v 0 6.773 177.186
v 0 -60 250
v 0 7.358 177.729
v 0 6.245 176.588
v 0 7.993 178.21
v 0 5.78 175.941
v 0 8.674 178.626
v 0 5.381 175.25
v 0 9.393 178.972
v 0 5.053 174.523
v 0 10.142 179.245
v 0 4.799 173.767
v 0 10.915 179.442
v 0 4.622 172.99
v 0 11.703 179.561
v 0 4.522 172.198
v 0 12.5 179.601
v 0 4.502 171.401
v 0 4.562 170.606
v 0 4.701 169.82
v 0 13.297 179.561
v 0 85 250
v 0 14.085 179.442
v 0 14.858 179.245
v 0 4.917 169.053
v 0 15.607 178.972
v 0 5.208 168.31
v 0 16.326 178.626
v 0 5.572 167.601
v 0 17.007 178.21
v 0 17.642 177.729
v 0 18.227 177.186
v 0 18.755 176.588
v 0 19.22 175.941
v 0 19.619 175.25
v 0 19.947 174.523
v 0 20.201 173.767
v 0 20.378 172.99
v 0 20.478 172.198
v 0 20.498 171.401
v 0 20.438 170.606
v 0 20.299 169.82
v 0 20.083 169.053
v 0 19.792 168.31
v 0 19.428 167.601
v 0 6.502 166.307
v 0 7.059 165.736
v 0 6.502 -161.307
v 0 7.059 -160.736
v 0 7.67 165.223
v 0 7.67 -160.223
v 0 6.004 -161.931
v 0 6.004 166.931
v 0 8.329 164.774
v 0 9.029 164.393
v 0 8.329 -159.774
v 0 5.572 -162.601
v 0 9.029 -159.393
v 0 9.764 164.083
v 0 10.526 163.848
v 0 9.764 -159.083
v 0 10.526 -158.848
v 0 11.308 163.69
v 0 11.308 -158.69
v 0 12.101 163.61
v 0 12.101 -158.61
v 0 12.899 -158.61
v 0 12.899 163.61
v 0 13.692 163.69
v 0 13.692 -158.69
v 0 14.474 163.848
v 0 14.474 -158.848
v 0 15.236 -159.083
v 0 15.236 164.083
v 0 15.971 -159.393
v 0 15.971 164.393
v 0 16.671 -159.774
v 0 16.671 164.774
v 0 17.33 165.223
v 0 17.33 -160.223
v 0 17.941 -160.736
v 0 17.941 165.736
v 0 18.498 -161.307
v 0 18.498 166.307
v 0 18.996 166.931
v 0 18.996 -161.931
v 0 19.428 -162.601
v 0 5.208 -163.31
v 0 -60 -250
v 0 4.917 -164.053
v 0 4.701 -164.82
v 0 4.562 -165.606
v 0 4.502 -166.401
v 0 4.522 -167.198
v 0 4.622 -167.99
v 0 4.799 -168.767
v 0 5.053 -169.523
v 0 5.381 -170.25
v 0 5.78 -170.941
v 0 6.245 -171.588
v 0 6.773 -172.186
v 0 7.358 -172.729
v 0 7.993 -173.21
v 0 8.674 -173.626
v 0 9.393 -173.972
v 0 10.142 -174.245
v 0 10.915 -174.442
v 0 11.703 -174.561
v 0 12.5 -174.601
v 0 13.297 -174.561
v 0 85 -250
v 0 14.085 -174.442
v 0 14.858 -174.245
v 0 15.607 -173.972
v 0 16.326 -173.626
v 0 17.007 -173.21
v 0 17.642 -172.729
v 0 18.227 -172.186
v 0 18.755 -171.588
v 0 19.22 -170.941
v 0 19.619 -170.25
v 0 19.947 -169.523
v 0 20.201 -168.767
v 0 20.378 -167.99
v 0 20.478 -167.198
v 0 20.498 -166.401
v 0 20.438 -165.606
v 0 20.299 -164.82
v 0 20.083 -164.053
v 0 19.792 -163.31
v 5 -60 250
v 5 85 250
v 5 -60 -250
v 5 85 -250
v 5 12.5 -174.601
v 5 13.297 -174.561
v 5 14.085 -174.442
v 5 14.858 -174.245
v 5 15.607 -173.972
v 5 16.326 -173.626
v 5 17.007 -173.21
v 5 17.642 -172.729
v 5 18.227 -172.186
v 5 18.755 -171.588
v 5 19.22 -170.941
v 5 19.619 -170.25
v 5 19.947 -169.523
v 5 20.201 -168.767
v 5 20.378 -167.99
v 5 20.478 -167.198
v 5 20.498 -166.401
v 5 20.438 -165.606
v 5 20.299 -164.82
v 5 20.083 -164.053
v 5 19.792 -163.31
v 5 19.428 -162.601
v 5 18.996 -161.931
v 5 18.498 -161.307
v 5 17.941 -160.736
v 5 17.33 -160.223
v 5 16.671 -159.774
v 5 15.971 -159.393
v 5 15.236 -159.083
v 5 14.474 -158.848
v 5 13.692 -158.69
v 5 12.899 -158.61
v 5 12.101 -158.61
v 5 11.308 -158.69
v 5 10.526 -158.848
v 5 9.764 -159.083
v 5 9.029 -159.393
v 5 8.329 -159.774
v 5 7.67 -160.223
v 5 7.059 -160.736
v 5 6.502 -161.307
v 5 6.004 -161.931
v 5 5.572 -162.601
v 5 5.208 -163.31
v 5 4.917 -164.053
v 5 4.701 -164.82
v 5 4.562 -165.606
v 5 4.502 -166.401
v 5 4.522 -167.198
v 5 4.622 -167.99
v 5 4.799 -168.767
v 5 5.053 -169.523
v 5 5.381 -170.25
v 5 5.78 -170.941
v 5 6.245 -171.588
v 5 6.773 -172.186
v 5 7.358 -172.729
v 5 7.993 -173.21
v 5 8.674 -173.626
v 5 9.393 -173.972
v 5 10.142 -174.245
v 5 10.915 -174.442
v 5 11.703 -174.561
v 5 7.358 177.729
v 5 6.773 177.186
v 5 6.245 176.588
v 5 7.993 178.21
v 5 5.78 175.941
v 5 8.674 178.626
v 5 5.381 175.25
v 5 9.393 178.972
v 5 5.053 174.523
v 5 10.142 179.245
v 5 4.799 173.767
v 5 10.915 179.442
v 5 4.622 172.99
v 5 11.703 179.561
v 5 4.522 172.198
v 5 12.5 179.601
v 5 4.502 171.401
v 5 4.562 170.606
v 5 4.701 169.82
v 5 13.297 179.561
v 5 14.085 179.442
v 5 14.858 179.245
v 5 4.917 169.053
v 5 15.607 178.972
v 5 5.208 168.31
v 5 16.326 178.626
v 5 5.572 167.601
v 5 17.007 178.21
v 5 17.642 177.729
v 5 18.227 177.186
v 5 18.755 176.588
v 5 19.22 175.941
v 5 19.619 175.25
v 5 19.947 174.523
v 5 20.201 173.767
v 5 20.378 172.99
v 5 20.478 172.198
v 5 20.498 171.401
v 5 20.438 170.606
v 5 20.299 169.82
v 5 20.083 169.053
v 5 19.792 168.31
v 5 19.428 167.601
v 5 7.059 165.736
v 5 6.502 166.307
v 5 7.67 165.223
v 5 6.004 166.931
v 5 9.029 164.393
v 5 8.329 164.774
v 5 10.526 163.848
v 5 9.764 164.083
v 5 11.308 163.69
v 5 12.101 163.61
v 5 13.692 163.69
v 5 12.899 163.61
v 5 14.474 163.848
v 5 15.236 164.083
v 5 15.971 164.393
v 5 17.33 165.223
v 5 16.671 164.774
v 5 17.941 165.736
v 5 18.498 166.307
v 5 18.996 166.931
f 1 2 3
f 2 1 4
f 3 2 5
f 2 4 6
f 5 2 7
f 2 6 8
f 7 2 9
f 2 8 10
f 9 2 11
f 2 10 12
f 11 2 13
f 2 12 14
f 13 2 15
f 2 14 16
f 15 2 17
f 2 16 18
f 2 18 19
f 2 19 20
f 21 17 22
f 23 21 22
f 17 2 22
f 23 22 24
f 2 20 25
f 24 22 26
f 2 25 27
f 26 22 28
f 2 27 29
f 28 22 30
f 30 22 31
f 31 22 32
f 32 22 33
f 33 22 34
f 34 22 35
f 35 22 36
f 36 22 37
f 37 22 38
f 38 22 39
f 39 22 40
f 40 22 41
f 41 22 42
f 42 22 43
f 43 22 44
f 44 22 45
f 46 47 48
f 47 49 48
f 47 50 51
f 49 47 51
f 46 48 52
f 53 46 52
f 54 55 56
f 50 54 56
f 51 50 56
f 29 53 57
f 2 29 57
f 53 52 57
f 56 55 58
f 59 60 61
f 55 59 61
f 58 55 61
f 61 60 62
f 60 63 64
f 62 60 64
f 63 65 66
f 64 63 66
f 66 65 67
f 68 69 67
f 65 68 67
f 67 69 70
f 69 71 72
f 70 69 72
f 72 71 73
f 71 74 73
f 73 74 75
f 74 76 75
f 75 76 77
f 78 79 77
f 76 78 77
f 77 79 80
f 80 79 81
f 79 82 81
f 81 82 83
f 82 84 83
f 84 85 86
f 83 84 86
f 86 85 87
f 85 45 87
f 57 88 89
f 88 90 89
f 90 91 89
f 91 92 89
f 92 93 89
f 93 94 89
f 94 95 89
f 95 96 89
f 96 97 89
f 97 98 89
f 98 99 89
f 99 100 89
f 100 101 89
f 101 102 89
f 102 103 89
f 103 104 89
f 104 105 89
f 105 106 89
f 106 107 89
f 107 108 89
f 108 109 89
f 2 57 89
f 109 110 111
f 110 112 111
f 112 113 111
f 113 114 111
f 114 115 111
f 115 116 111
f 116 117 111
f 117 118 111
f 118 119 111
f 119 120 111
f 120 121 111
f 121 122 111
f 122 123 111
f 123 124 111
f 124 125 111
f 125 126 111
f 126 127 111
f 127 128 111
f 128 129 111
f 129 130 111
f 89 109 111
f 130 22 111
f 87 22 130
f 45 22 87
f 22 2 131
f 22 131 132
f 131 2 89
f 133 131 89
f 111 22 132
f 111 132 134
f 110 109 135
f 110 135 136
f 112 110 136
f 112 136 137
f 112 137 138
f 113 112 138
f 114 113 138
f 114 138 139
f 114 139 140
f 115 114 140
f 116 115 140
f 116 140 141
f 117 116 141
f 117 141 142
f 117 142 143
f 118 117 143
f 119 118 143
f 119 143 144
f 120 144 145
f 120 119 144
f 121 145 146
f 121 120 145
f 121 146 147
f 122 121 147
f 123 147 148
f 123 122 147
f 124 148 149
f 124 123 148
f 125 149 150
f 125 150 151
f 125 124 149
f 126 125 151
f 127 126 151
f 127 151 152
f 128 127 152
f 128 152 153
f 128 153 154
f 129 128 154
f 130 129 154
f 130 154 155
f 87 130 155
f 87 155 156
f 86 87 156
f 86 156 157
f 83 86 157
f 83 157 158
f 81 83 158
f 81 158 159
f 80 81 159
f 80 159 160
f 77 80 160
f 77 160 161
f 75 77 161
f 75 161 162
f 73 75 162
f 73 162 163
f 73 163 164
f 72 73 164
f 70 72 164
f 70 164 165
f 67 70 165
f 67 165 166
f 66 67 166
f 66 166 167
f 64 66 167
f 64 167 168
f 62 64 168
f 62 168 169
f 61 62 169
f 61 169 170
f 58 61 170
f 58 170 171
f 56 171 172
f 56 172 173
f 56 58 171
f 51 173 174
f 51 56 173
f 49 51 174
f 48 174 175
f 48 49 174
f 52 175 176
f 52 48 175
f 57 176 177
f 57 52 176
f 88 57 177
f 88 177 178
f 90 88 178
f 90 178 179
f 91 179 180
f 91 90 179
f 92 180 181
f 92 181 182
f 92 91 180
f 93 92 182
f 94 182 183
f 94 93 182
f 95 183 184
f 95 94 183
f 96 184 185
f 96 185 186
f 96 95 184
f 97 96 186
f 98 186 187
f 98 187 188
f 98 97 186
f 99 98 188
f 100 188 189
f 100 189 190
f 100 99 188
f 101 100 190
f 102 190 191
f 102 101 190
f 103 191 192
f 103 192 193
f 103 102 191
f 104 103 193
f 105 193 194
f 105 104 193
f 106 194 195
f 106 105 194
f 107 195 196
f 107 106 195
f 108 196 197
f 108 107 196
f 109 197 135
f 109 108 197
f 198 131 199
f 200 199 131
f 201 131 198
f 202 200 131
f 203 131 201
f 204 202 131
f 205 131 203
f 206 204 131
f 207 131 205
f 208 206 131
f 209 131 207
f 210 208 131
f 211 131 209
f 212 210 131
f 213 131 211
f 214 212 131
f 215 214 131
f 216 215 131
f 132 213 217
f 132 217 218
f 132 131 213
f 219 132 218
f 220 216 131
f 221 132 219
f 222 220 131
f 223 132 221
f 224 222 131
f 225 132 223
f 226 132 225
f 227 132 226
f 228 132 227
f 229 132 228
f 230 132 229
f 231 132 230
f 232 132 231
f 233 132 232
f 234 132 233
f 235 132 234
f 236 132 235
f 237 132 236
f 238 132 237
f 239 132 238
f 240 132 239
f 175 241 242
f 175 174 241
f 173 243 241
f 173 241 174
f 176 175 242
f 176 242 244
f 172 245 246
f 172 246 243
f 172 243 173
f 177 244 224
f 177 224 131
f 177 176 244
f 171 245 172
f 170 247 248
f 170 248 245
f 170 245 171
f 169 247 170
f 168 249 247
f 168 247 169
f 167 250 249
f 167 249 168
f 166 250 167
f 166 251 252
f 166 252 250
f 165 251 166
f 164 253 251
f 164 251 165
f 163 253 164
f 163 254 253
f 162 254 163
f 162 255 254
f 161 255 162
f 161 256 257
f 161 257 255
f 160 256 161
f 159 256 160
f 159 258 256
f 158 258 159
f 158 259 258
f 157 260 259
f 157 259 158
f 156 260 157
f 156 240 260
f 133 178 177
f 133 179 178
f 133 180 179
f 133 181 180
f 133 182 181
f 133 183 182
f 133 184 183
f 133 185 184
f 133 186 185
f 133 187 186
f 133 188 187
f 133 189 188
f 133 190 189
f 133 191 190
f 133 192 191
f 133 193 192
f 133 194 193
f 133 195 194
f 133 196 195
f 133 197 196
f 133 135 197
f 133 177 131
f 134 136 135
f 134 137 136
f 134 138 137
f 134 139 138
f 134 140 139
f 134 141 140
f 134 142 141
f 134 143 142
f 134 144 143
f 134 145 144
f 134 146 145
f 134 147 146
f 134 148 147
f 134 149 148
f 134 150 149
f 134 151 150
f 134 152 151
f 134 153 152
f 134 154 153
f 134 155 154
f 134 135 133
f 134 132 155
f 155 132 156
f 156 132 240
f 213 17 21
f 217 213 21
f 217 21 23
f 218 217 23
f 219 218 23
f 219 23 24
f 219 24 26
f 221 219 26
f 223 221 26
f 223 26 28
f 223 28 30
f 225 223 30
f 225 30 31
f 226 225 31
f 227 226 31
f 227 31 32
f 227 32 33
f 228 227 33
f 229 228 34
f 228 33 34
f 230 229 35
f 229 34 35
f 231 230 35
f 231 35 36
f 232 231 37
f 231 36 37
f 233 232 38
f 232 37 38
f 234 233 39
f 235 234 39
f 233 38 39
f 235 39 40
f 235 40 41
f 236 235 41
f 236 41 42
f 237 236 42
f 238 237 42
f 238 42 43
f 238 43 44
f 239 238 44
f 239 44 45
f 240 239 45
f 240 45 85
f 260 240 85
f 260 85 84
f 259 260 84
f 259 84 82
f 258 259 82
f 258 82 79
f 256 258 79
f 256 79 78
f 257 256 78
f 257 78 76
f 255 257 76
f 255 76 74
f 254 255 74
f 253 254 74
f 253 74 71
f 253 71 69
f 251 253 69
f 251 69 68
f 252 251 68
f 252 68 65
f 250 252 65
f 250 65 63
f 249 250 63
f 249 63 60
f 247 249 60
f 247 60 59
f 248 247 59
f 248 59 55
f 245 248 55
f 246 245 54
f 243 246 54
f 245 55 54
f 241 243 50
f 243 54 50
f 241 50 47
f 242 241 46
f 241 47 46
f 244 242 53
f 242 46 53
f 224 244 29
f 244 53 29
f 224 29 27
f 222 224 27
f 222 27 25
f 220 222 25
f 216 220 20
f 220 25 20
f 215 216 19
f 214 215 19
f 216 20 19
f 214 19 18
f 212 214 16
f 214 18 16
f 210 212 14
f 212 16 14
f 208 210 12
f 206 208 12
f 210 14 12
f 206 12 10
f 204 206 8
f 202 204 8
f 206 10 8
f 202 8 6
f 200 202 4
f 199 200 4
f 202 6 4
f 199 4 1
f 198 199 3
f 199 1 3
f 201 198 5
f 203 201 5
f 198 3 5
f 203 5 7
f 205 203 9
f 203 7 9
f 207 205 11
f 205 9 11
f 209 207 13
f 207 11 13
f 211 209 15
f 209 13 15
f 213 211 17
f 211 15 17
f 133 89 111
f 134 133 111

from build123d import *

# Parameters (mm, degrees)
SKETCH2_W           = 500
SKETCH2_H           = 145
BOSS_EXTRUDE1_DEPTH = 5
CUT_EXTRUDE1_REACH  = 266.102
SKETCH3_R           = 8


with BuildPart() as part:
    # Sketch2 → Boss-Extrude1 (new body)
    with BuildSketch(Plane(origin=(0, 0, 0), x_dir=(0, 0, -1), z_dir=(1, 0, 0))):
        with Locations((0, 12.5)):
            Rectangle(SKETCH2_W, SKETCH2_H)
    extrude(amount=BOSS_EXTRUDE1_DEPTH)

    # Sketch3 → Cut-Extrude1 (cut, up to next)
    with BuildSketch(Plane.ZY, mode=Mode.PRIVATE) as cut_extrude1_sk1:
        with Locations((171.600500868, 12.5)):
            Circle(SKETCH3_R)
    cut_extrude1_tool1 = extrude(cut_extrude1_sk1.sketch, amount=-CUT_EXTRUDE1_REACH, mode=Mode.PRIVATE) & part.part
    cut_extrude1 = cut_extrude1_tool1.solids().sort_by_distance((0, 12.5, 171.600501))[0]
    add(cut_extrude1, mode=Mode.SUBTRACT)

    # Mirror1: Cut-Extrude1 across plane
    add(cut_extrude1.mirror(Plane.XY.offset(2.5)), mode=Mode.SUBTRACT)


solid = part.part
